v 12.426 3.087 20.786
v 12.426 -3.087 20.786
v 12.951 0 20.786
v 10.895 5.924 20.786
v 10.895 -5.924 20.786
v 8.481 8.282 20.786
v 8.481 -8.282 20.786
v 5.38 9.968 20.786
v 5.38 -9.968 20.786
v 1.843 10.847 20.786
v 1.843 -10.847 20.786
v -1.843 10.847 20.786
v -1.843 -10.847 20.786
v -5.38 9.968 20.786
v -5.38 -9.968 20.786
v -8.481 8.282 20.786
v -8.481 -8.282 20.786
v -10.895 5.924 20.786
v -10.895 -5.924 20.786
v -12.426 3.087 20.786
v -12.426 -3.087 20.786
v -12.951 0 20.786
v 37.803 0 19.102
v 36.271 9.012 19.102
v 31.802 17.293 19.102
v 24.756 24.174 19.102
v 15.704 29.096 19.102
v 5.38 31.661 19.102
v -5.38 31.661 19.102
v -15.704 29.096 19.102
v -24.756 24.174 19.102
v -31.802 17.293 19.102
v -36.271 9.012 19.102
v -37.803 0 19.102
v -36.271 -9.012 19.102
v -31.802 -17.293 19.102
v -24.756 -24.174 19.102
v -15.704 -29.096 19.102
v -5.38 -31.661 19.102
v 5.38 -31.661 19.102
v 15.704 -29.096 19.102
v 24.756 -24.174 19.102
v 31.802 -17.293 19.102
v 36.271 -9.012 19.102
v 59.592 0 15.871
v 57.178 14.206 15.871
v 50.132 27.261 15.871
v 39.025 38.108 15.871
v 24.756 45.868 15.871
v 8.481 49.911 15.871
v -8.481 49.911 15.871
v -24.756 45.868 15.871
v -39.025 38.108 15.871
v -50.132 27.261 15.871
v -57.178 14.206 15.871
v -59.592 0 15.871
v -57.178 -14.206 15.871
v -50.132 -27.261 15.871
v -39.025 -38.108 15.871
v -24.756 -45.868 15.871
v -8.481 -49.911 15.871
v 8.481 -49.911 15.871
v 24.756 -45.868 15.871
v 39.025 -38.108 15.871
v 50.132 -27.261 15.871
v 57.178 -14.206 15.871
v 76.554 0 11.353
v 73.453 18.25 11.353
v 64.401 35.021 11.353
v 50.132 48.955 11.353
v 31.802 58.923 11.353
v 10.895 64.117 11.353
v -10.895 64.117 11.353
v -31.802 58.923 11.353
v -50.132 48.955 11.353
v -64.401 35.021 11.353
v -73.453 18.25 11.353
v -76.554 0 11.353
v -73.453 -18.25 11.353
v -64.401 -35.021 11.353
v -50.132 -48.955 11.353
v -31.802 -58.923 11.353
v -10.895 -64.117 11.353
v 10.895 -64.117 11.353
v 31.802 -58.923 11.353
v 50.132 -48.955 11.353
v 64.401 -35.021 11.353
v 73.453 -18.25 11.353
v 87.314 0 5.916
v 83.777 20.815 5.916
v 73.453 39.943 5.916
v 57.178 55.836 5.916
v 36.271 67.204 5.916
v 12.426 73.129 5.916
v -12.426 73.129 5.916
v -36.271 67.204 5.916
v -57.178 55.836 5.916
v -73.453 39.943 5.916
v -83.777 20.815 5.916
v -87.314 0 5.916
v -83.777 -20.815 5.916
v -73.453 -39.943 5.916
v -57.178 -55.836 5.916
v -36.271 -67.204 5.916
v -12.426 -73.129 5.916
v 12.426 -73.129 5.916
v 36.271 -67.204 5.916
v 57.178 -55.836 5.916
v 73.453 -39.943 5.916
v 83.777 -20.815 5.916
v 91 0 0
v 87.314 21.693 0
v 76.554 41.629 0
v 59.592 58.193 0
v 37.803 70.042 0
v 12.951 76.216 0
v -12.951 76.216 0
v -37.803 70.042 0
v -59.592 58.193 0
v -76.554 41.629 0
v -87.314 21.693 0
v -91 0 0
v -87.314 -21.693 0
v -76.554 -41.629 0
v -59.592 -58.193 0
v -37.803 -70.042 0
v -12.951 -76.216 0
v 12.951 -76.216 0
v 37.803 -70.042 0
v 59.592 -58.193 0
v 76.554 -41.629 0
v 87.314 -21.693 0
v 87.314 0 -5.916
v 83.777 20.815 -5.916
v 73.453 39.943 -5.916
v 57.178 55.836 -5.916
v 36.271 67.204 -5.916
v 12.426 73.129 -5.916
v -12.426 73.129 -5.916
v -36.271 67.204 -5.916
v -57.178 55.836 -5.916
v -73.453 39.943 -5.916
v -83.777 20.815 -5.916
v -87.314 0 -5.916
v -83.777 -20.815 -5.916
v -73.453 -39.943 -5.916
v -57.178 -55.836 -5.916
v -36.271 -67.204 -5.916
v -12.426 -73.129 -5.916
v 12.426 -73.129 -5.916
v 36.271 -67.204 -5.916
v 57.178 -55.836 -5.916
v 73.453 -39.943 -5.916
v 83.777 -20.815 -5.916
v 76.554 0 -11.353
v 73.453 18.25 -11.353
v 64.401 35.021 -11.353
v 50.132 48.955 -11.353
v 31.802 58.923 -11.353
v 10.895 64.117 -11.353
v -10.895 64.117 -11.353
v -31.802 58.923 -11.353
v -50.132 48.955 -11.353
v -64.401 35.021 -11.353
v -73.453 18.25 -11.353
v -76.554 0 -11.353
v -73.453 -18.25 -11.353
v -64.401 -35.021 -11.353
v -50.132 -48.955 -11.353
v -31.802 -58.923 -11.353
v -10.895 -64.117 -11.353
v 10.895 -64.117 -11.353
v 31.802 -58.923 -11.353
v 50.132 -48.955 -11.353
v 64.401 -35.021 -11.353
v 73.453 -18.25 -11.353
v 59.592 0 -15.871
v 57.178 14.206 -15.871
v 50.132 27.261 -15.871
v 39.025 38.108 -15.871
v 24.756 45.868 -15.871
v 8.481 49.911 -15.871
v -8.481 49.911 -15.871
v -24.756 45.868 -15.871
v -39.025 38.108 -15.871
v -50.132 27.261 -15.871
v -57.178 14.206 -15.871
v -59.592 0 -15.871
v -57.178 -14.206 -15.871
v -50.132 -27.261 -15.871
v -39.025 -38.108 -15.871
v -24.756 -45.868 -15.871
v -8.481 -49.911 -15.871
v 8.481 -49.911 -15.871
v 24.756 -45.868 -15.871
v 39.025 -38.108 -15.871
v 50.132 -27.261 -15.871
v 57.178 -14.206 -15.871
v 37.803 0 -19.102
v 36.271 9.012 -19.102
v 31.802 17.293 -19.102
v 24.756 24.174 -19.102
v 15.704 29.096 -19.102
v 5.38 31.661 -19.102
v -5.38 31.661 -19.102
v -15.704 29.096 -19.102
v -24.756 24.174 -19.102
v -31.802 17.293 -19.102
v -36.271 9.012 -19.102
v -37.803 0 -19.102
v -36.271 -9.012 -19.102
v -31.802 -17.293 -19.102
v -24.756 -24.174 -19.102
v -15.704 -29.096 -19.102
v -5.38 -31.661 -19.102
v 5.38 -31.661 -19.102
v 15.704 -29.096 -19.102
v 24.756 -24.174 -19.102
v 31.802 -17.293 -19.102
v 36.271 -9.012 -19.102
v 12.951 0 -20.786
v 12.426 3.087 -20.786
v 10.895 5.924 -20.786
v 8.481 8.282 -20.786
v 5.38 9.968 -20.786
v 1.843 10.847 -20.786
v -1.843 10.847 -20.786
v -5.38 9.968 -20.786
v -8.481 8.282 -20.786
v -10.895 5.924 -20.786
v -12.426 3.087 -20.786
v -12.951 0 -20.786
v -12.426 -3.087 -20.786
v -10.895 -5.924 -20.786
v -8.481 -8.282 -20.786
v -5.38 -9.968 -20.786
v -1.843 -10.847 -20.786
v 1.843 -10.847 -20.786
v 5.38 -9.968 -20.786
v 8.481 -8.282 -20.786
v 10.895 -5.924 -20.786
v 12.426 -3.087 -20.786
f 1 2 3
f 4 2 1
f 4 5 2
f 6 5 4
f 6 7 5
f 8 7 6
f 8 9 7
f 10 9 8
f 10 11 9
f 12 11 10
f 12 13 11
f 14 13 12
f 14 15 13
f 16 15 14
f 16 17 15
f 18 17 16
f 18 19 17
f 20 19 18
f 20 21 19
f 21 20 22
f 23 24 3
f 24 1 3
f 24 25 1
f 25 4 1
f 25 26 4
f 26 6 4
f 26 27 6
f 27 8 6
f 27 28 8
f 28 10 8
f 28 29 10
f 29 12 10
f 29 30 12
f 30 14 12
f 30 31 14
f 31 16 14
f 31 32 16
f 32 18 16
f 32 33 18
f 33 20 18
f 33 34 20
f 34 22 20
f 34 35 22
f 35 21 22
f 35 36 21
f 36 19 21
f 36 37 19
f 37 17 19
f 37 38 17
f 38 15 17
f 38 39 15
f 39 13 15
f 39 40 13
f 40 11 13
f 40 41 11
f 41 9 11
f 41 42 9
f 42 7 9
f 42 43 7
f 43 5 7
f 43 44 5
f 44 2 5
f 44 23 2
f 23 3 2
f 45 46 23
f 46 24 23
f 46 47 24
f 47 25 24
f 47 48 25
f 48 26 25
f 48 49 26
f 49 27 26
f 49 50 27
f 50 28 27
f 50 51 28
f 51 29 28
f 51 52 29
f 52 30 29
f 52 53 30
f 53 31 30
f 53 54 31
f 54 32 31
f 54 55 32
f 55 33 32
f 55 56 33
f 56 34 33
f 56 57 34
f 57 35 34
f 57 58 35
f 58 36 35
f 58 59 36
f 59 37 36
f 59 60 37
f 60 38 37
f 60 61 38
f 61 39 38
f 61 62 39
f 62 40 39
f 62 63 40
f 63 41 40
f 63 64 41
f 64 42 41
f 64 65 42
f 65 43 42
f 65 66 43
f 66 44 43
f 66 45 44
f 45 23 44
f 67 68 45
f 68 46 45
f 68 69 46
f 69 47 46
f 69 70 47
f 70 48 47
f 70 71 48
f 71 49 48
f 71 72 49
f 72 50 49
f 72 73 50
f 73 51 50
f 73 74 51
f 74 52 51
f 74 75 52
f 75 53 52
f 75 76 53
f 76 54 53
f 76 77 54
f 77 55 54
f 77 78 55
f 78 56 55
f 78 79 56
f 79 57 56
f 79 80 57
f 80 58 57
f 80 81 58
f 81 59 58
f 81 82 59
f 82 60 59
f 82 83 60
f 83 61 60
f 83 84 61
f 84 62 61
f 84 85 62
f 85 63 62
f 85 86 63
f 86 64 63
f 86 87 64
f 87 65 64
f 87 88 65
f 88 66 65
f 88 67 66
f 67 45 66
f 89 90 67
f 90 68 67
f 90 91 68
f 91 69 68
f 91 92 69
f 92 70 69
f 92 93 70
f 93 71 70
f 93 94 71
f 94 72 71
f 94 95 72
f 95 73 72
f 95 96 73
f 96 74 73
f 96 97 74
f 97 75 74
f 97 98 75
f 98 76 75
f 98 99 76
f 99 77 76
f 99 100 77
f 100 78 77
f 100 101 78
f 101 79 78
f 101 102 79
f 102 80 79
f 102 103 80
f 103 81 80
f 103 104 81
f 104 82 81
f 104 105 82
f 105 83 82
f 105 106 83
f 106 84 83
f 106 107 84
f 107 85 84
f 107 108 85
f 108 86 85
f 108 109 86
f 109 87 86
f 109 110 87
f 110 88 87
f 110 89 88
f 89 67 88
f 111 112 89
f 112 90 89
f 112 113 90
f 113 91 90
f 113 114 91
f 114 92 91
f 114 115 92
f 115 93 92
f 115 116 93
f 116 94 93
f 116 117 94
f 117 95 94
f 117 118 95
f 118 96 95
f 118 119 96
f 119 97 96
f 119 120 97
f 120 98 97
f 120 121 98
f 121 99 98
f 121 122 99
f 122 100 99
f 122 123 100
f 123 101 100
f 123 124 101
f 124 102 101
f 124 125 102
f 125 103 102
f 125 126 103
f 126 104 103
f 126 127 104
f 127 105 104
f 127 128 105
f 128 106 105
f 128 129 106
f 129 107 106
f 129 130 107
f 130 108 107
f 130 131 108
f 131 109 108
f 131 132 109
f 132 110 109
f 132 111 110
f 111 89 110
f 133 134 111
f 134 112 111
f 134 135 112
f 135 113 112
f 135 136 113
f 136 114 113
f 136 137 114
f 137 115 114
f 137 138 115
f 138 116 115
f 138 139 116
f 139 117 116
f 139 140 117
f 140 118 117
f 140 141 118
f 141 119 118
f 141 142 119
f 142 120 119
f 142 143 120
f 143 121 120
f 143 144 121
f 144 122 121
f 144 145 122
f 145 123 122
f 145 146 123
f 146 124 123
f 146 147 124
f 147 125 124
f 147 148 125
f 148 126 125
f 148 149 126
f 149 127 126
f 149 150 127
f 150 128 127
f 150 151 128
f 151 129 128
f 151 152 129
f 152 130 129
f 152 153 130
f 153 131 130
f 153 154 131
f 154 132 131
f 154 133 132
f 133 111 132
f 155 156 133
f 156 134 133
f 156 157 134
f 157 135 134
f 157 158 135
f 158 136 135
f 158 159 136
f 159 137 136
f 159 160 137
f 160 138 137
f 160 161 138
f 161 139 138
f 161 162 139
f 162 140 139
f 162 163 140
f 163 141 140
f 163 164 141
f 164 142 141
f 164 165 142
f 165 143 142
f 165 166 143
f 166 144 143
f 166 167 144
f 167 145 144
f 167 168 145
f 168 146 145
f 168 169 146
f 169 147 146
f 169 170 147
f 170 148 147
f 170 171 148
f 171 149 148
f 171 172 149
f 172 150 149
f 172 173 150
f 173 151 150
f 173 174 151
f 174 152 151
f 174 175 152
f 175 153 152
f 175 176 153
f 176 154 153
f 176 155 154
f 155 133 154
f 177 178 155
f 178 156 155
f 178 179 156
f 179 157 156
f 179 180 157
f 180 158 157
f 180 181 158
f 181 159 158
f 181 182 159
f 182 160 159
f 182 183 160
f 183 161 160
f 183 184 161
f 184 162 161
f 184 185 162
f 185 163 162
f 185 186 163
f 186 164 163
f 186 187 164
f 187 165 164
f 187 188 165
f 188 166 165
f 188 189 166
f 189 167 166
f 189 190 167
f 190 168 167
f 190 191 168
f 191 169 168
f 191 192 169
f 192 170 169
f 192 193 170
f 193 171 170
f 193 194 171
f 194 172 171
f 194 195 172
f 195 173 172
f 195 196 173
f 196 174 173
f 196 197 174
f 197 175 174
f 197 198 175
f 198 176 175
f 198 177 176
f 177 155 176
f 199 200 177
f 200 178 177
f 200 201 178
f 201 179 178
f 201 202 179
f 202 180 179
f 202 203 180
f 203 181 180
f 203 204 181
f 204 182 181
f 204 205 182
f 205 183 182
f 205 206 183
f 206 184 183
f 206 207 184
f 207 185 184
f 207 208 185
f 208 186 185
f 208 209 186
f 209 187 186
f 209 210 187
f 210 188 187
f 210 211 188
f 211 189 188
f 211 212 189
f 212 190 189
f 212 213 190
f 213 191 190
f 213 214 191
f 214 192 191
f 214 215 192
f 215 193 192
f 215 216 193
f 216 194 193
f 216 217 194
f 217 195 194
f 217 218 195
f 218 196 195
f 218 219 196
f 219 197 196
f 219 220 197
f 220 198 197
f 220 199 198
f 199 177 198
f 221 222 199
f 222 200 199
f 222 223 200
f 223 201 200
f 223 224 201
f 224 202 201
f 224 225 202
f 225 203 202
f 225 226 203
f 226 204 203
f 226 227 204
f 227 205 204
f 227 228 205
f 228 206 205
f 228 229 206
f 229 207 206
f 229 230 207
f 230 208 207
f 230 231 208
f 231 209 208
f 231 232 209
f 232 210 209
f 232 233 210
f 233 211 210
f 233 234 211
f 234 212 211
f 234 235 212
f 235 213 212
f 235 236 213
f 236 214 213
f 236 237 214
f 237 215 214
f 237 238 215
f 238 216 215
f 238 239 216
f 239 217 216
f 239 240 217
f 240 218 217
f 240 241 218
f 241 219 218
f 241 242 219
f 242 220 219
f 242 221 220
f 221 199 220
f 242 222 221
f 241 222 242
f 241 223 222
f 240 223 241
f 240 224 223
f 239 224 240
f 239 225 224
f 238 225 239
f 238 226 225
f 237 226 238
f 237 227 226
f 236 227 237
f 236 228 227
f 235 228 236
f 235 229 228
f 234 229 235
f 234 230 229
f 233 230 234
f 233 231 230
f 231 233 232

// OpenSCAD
// Generated by SolidPython 1.0.1 on 2020-07-29 00:46:50


scale(v = [13, 11, 3]) {
	sphere(r = 7);
}
/***********************************************
*********      SolidPython code:      **********
************************************************
 
# import packages: SolidPython
from solid import *
from solid.utils import *
from itertools import chain, combinations, permutations


class Resize:

    def __init__(self, scad_file):
        self.scad_file = scad_file
        #self.scad_file = import_scad(scad_file)
        # cone/cylinder param:
        self.r1 = 0
        self.r2 = 0
        self.h = 0
        # rectangular prism param:
        self.w = 0
        self.l = 0
        # ellipse param:
        self.r = 0

    # import OpenScad code (file name corresponds to shape)


    # classify shape + parameters
    def assign(self, param1, param2, param3):
        if self.scad_file == 'cone.scad':
            self.r1 = param1
            self.r2 = param2
            self.h = param3
        elif self.scad_file == 'cylinder.scad':
            self.r1 = param1
            self.r2 = param2
            self.h = param3
        elif self.scad_file == 'rectangularPrism.scad':
            self.h = param1
            self.l = param2
            self.w = param3
        else:
            self.r = param1
            self.h = param2

    # resize parameters
    def iterate(self):
        x = range(3, 20, 2)
        i = 1
        if self.scad_file == 'cone.scad':
            tempList = list(permutations(x, 2))
            for temp in tempList:
                param1 = temp[0]
                param2 = temp[1]
                filepath = 'produced_scad_files/' + 'cone' + str(param1) + '_' + str(param2) + '_' + '.scad'
                scad_render_to_file(cylinder(h=param1, r1=param2, r2=0), filepath)

        elif self.scad_file == 'cylinder.scad':
            tempList = list(permutations(x, 3))
            for temp in tempList:
                param1 = temp[0]
                param2 = temp[1]
                filepath = 'produced_scad_files/' + 'cylinder' + str(param1) + '_' + str(param2) + '_' + '.scad'
                scad_render_to_file(cylinder(h=param1, r1=param2, r2=param2), filepath)

        elif self.scad_file == 'rectangularPrism.scad':
            tempList = list(permutations(x, 3))
            for temp in tempList:
                param1 = temp[0]
                param2 = temp[1]
                param3 = temp[2]
                filepath = 'produced_scad_files/' + 'rectangularPrism' + str(param1) + '_' + str(param2) + '_' + str(
                    param3) + '.scad'
                scad_render_to_file(cube(size=(param1, param2, param3)), filepath)

        elif self.scad_file == 'ellipse.scad':
            tempList = list(permutations(x, 4))
            for temp in tempList:
                param1 = temp[0]
                param2 = temp[1]
                param3 = temp[2]
                param4 = temp[3]
                filepath = 'produced_scad_files/' + 'ellipse' + str(param1) + '_' + str(param2) + '_' + str(param3) + '_' + str(param4) + '.scad'
                scad_render_to_file(scale([param1, param2, param3])(sphere(r=param4)), filepath)

    def render_to_scadfile(self):
        scad_render_to_file(scad, 'example.scad') 
 
************************************************/
